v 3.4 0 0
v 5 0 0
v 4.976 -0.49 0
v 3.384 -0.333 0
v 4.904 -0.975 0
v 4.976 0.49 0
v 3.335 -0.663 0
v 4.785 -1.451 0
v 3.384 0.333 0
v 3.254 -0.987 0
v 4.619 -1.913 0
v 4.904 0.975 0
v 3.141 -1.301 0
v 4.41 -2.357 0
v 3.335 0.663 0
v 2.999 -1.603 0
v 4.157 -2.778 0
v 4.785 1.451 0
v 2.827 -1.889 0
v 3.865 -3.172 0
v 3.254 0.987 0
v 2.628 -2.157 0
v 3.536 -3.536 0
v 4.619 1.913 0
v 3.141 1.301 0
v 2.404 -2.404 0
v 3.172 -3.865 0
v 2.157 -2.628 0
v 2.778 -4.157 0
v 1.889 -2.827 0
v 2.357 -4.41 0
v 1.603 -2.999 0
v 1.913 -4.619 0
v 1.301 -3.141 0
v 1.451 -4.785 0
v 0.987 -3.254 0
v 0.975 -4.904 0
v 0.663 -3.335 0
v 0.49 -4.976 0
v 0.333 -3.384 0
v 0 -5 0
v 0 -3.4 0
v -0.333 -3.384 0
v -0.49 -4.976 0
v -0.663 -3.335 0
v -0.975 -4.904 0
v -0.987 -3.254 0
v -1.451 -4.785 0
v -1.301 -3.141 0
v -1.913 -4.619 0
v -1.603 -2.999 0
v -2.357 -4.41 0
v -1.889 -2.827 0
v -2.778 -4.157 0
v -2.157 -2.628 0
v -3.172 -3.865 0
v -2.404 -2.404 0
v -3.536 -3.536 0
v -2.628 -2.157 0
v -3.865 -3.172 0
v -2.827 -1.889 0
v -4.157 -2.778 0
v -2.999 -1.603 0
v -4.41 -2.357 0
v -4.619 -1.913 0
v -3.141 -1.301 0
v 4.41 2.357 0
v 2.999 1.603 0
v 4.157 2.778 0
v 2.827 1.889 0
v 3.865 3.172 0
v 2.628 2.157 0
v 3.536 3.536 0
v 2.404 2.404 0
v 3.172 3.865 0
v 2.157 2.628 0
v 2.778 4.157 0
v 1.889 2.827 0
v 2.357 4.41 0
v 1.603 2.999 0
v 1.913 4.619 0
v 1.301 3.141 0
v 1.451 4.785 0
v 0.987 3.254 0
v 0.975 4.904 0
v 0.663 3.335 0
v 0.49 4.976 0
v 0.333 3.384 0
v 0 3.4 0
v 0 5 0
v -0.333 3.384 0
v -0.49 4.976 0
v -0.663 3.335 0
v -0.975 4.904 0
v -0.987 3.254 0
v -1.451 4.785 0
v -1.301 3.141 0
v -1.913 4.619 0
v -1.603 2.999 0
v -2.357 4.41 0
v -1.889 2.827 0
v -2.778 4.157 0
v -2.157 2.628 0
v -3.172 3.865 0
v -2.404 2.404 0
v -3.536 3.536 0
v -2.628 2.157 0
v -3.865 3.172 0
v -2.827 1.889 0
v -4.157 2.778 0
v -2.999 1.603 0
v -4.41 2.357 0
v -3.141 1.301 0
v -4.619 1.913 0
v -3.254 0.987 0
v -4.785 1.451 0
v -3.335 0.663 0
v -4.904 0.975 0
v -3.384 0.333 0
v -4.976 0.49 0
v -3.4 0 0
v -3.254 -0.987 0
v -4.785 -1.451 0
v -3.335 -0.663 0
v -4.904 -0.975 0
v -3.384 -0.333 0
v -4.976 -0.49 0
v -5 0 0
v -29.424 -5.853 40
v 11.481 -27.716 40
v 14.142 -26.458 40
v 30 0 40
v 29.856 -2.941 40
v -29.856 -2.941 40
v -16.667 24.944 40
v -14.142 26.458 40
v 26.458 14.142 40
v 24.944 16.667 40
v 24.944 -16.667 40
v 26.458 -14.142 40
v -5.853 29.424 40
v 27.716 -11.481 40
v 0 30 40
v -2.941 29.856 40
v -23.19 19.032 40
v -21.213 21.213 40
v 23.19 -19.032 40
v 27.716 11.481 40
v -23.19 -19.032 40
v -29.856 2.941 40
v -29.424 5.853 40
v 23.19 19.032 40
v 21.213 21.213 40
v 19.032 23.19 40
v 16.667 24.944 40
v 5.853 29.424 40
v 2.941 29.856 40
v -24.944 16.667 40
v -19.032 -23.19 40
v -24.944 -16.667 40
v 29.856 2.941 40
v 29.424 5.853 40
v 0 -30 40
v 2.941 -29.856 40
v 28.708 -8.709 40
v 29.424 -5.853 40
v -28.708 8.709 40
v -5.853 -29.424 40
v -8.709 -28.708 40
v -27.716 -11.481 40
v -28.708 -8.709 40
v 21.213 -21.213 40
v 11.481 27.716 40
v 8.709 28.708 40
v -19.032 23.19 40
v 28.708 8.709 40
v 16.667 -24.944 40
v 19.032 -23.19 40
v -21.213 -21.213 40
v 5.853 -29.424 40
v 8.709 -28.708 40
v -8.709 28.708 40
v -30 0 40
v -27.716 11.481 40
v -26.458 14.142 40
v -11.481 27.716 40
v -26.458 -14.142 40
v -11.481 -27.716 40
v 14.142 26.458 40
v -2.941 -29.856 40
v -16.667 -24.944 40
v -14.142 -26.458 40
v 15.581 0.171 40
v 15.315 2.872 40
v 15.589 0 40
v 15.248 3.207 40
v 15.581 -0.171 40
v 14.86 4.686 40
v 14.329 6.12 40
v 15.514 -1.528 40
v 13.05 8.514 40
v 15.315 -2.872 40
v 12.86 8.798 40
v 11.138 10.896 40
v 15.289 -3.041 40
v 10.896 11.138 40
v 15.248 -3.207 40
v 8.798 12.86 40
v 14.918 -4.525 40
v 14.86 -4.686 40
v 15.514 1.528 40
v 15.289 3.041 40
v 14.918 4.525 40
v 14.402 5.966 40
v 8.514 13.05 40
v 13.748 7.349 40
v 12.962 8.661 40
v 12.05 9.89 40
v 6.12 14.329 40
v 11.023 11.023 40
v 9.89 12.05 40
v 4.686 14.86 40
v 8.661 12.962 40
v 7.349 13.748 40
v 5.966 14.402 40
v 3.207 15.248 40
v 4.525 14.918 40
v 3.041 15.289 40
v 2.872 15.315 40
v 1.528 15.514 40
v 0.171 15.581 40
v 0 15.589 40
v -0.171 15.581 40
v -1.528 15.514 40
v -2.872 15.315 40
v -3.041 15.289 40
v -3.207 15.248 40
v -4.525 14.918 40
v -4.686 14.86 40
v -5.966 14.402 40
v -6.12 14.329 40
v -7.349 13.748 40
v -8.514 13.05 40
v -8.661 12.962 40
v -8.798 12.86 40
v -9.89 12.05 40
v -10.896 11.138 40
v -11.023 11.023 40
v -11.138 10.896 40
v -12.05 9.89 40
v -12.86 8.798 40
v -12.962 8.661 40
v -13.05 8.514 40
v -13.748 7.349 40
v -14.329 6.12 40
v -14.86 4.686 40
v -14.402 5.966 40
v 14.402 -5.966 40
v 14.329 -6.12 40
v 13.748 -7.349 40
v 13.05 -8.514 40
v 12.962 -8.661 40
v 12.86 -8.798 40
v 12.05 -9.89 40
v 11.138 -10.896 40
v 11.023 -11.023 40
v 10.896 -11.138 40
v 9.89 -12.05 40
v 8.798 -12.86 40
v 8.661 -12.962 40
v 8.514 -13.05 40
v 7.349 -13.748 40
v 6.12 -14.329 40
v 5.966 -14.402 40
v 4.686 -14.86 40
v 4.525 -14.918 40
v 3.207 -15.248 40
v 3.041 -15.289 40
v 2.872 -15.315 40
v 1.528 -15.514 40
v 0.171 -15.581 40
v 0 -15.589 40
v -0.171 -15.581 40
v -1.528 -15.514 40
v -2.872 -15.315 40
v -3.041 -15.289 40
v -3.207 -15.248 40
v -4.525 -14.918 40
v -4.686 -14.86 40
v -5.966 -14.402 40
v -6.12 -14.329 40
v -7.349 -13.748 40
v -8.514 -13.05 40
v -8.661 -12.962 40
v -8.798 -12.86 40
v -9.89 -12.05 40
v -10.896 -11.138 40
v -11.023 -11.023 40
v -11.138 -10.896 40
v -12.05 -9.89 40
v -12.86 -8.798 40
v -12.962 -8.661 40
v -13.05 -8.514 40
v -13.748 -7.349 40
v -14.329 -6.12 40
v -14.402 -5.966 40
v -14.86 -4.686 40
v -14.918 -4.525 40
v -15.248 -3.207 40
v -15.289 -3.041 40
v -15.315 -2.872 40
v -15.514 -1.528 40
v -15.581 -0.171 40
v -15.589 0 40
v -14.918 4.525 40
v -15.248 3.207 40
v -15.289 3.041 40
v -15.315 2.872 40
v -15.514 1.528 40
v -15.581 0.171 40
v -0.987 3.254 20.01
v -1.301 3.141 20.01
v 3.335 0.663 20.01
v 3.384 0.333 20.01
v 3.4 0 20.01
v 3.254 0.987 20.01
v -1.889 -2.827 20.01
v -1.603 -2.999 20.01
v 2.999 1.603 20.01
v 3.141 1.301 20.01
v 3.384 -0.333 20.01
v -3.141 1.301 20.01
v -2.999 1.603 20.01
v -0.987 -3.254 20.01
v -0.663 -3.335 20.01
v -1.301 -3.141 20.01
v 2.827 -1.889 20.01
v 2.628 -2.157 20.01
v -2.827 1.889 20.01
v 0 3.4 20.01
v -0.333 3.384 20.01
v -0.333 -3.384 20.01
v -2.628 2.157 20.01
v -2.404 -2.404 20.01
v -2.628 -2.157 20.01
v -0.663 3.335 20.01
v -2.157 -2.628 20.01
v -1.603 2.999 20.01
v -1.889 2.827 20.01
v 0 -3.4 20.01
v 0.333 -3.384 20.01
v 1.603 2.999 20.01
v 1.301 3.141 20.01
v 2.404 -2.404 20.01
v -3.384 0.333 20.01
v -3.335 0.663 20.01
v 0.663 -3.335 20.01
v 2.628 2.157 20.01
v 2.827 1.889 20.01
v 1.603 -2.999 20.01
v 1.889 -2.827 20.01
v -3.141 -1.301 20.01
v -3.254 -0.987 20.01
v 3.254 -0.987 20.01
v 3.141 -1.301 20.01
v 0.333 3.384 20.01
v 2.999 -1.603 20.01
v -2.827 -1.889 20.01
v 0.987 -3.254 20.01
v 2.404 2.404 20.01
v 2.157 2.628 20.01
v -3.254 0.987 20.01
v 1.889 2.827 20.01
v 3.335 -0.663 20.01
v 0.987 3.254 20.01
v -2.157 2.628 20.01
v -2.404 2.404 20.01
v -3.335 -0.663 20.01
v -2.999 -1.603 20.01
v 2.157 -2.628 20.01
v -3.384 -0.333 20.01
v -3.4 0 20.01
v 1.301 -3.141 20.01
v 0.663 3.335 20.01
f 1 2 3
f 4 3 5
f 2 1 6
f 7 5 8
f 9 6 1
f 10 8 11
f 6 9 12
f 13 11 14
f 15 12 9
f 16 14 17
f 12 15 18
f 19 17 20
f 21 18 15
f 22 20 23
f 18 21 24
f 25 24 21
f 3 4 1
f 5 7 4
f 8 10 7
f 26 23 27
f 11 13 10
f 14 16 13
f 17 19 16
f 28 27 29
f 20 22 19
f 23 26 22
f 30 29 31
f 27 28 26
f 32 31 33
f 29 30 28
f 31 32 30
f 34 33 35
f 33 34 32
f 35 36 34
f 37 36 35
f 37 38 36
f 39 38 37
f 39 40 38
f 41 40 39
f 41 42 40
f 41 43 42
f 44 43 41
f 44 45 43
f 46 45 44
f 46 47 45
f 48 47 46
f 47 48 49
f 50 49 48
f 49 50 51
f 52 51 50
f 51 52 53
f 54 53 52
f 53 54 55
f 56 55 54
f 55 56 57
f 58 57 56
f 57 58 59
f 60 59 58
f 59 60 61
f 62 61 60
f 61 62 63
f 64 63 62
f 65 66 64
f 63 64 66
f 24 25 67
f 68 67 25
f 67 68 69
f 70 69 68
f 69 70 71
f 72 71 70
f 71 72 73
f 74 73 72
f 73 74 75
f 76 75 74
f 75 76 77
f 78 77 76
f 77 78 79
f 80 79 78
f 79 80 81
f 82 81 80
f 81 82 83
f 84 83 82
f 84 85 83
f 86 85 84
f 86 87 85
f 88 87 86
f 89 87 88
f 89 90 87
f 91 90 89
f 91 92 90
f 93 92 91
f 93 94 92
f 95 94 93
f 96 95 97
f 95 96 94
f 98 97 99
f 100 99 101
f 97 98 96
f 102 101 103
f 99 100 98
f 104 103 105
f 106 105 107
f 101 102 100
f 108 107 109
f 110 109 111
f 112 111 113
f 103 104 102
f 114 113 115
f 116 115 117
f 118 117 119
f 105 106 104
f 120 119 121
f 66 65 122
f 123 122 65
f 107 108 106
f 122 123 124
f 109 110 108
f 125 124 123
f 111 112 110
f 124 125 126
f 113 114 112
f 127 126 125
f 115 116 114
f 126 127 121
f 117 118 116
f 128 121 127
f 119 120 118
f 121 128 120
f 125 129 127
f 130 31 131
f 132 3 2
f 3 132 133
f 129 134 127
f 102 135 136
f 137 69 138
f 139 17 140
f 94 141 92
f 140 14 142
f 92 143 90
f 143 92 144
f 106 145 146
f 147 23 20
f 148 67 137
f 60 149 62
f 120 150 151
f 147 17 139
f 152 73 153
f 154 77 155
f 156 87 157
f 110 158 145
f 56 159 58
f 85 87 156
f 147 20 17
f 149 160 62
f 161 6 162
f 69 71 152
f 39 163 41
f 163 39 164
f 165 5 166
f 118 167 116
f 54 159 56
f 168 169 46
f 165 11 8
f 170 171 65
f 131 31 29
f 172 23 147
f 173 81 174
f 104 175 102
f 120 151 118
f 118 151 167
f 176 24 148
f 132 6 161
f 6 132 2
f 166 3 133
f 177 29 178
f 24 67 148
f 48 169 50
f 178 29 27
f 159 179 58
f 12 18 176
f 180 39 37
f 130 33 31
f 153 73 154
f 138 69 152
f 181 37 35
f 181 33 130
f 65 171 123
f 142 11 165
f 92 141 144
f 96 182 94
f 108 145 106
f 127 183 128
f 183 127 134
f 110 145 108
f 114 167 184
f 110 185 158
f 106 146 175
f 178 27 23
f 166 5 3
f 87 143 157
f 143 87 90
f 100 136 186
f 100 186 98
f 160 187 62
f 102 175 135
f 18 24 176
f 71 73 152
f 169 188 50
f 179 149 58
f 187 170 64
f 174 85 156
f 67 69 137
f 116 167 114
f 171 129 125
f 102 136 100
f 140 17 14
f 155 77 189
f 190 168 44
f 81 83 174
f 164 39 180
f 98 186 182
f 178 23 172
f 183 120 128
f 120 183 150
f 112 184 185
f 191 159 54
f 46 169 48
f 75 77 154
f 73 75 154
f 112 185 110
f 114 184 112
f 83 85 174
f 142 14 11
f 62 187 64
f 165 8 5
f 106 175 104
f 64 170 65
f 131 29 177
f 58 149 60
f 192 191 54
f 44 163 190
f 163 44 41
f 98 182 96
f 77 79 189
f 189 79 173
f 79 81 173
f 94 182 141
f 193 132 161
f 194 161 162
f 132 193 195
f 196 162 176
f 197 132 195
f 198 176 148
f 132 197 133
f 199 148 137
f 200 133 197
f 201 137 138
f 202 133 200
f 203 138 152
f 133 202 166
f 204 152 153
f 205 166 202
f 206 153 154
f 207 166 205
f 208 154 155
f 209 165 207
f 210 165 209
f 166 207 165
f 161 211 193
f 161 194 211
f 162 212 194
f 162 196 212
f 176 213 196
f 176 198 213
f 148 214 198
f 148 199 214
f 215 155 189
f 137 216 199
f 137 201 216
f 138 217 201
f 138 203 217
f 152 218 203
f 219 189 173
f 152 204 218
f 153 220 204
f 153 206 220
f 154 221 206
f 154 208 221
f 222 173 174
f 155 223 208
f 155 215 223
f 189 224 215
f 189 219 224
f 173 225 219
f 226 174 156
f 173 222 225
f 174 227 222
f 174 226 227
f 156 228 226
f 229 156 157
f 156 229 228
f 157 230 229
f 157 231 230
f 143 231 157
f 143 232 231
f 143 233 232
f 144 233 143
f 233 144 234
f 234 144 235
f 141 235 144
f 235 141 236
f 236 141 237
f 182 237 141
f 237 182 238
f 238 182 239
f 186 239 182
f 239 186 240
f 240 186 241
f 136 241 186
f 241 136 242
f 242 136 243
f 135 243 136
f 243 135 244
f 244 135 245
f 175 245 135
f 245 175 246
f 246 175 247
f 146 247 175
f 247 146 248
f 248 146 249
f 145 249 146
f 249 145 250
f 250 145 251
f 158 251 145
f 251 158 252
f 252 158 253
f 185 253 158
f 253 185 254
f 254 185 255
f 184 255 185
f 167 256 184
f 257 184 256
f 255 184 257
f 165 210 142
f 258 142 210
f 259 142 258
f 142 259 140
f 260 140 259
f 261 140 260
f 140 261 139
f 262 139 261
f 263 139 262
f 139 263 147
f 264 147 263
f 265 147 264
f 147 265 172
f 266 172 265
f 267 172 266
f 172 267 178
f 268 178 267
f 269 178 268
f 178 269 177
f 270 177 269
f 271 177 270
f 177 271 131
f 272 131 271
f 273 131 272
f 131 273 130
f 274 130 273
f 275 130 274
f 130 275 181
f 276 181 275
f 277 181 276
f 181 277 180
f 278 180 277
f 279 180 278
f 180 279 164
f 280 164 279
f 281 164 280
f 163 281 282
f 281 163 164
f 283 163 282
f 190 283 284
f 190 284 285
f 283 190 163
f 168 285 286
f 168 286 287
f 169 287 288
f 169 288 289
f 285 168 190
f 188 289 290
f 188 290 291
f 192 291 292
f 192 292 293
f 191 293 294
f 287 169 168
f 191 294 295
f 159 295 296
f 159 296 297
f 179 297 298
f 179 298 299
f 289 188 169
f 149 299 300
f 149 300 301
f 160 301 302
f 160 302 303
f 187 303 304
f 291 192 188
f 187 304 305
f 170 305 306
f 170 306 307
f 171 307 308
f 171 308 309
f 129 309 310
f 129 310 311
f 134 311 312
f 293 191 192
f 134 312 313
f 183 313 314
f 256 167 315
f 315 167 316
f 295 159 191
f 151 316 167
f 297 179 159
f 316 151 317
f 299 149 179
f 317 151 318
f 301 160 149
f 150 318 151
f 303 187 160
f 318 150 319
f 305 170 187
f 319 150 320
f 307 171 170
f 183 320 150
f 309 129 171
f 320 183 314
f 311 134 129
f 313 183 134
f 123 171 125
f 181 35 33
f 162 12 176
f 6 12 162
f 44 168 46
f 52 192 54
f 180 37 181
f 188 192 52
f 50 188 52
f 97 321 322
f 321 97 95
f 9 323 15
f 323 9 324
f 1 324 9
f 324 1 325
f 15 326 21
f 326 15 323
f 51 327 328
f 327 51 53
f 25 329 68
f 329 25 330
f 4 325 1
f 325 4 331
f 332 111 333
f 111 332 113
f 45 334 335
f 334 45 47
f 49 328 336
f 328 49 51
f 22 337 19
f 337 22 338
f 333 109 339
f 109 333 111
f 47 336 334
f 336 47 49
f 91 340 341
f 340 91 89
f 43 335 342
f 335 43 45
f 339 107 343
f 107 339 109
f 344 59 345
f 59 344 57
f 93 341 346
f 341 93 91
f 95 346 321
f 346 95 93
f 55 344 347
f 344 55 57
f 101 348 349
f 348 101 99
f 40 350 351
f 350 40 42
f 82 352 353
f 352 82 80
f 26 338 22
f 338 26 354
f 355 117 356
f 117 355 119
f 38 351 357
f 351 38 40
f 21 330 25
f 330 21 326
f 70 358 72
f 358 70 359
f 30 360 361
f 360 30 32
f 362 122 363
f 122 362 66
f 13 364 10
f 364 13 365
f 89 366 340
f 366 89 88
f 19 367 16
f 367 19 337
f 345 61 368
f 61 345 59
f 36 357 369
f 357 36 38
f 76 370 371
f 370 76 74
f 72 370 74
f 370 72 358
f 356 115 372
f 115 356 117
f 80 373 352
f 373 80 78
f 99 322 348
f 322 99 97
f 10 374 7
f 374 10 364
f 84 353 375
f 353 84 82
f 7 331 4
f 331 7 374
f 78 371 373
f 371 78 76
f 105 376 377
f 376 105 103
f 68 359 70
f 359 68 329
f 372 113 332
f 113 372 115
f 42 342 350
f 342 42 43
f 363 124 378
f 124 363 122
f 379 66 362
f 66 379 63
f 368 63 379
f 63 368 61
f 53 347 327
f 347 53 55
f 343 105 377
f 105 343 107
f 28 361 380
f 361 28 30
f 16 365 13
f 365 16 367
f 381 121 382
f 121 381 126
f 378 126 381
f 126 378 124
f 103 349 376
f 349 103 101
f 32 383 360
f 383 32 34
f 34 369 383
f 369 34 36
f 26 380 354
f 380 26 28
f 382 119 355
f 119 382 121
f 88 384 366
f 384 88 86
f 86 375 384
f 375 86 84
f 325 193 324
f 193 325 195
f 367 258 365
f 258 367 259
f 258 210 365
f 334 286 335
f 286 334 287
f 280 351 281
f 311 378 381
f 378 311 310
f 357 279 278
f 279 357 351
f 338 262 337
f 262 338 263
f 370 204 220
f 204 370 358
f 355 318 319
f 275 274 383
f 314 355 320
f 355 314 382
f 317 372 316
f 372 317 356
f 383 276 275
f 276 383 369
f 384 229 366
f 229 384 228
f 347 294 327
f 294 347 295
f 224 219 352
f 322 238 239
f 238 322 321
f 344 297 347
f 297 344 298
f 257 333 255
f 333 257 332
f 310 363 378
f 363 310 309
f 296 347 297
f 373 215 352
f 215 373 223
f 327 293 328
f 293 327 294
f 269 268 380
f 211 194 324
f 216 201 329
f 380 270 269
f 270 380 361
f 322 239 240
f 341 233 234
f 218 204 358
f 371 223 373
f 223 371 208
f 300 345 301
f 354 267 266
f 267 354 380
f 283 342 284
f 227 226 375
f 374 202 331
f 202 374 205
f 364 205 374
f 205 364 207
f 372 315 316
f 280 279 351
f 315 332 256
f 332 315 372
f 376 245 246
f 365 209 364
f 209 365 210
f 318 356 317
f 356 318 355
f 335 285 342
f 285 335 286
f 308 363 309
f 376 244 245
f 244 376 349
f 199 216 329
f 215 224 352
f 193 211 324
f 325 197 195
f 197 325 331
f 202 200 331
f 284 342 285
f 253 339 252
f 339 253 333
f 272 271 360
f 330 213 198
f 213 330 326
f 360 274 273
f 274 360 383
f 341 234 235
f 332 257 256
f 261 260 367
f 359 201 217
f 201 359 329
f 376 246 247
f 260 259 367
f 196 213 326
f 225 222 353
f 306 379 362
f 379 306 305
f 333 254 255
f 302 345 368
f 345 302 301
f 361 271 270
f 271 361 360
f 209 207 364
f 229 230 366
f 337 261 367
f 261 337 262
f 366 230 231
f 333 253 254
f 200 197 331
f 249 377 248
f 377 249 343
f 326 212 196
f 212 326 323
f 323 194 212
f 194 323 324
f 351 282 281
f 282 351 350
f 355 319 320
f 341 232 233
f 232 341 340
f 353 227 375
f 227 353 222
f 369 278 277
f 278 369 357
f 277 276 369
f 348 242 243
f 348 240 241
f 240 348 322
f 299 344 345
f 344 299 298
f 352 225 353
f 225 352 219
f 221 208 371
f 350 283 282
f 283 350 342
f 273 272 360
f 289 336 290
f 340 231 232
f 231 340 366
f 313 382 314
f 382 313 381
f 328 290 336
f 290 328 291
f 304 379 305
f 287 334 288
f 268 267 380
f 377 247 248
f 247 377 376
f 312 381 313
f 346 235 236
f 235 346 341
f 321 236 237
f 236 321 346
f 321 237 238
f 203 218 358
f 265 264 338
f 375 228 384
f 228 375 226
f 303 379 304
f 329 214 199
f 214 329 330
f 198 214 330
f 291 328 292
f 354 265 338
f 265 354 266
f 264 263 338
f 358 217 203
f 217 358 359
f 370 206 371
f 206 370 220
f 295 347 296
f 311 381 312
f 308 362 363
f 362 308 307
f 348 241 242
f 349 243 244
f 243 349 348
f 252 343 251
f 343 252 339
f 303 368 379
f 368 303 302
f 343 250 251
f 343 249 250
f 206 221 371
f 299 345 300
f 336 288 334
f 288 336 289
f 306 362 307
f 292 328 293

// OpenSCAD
// Funnel - a spout (tube) with a conical section above, open at both ends. NOVEL general part.
//

spout_d  = 10;
spout_l  = 20;
cone_top = 10;
cone_rim = 60;
wall     = 1.6;

$fn = 64;

ib = max(1.6, spout_d - 2 * wall);   // keep a bore even if the wall is thicker than the wall

translate([0, 0, 0])
difference() {
    union() {
        cylinder(h = spout_l, d = spout_d);                 // spout (tube)
        cylinder(h = cone_rim - spout_l, d1 = spout_d, d2 = cone_rim);   // cone above the spout
    }
    translate([0, 0, -1])
    cylinder(h = spout_l + 2, d = ib);                     // through-bore: the spout is hollow
    translate([0, 0, spout_l + 0.01])
    cylinder(h = cone_rim - spout_l + 1, d1 = ib, d2 = cone_rim - 2 * wall);   // thin the cone wall (open bottom)
}
